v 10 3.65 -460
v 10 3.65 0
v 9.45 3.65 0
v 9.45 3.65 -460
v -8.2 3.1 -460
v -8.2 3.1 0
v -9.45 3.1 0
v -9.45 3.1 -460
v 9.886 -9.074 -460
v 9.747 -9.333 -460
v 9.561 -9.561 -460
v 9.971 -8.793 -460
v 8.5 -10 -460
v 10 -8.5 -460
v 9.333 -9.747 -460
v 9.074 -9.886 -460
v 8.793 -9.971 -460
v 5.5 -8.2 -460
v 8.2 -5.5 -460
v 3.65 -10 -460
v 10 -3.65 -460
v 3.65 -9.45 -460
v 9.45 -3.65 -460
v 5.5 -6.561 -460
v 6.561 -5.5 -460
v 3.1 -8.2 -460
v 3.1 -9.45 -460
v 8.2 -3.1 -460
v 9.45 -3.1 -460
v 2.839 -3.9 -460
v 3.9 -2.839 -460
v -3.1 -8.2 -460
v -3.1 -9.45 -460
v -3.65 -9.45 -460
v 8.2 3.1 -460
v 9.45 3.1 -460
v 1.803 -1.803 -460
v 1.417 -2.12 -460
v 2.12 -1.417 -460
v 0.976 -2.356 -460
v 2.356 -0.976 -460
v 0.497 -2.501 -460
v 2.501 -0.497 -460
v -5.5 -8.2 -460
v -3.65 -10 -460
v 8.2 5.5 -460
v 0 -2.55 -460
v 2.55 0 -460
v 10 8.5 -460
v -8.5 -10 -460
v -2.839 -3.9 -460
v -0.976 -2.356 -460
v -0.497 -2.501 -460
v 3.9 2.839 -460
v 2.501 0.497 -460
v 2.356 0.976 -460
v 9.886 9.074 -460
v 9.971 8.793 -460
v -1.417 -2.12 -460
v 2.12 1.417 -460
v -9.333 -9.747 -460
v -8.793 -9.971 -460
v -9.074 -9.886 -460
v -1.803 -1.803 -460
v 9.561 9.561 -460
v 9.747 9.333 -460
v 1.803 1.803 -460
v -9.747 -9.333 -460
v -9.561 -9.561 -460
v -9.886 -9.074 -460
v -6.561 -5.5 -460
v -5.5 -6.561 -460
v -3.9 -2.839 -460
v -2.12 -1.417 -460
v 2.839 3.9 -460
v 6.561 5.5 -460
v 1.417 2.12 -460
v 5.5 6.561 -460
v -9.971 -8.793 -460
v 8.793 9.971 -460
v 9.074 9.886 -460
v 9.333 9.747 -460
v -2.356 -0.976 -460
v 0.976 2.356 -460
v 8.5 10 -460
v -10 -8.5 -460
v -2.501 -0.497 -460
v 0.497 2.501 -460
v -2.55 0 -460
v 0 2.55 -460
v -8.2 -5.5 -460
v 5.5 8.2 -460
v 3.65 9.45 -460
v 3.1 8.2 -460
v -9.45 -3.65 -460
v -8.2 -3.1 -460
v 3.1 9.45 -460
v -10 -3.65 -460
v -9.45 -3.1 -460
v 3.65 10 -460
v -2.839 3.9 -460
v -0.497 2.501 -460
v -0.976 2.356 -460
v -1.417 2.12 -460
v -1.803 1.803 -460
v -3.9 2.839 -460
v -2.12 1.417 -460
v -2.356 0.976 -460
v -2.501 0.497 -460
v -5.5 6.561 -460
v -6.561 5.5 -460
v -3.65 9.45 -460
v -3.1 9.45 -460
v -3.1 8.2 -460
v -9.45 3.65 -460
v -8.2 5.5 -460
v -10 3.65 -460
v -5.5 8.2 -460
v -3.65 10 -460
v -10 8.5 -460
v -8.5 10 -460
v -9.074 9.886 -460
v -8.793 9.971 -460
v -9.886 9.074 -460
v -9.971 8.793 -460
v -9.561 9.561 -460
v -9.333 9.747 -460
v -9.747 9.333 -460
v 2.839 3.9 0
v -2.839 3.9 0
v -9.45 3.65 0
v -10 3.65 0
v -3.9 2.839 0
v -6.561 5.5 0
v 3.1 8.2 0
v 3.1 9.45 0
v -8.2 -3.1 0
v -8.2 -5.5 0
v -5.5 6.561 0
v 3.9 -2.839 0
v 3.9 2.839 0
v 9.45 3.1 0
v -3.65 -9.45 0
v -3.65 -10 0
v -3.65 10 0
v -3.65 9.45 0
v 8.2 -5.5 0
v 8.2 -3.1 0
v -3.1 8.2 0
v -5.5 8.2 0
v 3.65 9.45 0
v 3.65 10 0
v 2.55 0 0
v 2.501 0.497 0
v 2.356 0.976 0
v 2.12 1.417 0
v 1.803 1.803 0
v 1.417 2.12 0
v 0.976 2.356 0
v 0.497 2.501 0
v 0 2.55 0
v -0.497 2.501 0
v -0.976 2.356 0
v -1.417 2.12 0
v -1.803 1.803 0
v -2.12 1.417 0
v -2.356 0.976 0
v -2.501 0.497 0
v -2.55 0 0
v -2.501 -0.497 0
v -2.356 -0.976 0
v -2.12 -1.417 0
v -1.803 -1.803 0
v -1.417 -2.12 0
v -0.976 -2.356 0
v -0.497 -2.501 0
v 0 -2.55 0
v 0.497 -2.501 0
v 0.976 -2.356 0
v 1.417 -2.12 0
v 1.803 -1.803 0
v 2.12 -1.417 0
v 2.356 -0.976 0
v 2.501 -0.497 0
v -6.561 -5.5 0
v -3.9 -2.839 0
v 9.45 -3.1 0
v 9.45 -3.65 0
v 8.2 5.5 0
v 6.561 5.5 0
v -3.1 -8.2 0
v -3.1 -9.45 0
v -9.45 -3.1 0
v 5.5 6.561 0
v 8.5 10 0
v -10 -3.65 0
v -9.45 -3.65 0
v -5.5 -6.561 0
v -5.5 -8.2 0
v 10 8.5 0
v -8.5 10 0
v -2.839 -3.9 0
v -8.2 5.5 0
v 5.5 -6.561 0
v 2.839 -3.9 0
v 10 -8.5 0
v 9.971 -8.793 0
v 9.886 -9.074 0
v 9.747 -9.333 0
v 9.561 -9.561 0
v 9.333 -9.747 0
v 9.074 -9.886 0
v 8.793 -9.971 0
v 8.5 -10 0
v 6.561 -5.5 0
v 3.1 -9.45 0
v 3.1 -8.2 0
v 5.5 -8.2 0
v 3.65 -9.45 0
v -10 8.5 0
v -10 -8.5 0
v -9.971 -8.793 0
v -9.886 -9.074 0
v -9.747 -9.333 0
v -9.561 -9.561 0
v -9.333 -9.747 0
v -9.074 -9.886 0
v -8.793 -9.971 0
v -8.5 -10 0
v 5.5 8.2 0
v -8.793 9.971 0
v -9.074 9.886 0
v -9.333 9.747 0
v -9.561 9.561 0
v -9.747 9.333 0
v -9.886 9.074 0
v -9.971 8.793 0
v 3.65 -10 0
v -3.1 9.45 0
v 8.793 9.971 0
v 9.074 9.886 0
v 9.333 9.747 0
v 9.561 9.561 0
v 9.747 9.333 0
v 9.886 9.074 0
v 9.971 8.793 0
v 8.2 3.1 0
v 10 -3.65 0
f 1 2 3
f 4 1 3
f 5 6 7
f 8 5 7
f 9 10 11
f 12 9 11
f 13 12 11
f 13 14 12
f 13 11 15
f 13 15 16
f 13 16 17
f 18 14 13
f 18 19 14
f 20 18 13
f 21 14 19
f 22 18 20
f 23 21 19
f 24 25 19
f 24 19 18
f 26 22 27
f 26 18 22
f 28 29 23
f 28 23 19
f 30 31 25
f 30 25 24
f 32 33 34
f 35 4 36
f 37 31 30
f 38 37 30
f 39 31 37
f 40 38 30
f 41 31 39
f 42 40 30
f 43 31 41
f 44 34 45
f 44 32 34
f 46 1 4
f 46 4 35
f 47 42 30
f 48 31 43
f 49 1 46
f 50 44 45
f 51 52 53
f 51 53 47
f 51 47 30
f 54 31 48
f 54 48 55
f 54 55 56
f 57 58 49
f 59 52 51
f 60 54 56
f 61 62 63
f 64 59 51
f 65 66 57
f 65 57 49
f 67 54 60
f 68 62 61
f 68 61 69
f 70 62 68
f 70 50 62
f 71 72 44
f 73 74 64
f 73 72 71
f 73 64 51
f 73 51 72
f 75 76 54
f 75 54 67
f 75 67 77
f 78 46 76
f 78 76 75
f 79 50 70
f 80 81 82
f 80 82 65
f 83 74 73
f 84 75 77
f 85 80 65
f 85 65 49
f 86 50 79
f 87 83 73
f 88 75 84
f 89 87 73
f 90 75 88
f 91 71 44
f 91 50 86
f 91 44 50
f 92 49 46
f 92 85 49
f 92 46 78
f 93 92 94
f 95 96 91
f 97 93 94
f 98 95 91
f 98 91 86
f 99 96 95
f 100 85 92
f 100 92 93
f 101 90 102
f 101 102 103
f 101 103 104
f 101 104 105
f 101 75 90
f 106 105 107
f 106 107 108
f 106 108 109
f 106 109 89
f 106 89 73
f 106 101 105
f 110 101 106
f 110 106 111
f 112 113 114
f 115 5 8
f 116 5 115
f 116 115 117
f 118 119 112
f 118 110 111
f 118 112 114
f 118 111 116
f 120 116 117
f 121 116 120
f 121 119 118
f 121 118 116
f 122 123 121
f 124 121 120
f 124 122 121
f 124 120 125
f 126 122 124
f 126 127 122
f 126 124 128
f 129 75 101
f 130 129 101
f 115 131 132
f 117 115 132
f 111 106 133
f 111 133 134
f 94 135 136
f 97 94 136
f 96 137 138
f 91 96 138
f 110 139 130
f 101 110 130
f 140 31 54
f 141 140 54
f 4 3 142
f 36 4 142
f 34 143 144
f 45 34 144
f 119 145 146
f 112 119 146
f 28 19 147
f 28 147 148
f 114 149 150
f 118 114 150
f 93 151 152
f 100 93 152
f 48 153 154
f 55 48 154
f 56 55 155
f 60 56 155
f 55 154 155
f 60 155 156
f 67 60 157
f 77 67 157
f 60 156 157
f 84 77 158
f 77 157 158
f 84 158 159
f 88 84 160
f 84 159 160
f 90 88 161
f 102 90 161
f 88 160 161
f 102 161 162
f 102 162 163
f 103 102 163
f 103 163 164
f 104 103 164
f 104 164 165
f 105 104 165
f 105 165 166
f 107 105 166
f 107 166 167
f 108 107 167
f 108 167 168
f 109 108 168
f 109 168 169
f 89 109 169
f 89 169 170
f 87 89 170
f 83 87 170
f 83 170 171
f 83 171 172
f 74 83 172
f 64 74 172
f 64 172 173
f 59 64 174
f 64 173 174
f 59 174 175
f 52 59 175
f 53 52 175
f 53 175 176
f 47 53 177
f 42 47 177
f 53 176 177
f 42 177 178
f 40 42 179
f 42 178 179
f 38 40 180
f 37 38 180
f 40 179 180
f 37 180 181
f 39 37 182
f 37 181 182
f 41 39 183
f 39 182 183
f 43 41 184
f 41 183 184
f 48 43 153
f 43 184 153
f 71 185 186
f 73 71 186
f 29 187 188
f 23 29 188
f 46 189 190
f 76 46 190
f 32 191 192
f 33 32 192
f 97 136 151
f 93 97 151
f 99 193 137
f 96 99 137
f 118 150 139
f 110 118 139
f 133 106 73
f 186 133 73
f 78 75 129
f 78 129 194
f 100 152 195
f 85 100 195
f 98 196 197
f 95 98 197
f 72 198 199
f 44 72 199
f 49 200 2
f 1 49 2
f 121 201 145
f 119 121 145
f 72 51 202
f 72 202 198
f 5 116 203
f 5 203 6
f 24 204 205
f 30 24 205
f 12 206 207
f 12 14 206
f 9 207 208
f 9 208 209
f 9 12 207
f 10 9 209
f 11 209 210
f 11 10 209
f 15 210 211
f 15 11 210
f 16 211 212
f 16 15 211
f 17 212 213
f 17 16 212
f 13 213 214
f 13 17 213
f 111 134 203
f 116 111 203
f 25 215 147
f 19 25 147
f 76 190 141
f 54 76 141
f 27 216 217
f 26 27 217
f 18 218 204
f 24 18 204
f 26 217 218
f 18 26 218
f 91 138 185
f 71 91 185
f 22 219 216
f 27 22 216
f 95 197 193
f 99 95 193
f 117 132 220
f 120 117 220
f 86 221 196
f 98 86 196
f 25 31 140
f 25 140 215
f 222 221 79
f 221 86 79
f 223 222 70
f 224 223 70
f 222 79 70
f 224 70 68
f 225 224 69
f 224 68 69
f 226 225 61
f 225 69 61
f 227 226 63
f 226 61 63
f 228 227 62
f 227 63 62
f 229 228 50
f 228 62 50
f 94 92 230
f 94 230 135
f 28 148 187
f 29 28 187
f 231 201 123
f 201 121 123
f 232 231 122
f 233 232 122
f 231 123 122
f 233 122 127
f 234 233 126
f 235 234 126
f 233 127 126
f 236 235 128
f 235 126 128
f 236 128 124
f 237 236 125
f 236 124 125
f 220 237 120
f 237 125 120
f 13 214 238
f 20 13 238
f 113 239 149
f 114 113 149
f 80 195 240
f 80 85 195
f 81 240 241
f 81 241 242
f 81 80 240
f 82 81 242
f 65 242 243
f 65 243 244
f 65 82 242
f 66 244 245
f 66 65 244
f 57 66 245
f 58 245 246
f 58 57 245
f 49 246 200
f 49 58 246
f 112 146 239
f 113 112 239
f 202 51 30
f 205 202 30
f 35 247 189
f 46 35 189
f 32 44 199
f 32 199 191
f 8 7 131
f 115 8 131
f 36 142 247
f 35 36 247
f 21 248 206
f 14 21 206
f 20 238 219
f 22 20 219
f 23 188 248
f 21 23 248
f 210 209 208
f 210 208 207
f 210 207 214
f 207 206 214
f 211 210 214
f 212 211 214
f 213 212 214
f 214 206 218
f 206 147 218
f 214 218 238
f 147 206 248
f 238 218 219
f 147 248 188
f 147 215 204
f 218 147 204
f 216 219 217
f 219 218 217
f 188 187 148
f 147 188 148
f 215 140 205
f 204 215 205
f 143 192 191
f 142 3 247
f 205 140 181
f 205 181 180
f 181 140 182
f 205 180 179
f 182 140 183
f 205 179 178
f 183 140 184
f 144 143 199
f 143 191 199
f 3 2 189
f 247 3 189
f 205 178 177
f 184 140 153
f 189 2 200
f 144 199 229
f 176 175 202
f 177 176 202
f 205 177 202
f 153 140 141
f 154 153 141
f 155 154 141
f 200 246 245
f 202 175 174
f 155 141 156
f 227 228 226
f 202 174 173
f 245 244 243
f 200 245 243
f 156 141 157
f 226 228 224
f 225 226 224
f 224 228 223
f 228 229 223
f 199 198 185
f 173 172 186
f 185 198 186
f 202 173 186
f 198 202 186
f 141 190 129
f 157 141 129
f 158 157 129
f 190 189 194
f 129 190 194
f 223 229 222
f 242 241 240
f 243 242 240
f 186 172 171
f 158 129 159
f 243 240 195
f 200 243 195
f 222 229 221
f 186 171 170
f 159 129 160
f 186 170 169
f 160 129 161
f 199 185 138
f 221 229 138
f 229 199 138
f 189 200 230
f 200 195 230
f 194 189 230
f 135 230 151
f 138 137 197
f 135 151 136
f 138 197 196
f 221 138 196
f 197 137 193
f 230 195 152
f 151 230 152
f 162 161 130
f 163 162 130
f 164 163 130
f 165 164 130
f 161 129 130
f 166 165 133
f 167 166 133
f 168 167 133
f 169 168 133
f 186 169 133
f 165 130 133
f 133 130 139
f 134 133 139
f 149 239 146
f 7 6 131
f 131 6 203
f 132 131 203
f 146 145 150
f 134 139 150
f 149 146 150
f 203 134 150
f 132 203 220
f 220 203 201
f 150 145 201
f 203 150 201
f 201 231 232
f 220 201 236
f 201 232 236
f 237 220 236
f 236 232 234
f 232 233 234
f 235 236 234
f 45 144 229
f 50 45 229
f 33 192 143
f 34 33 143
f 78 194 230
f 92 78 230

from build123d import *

# Parameters (mm, degrees)
BOSS_EXTRUDE1_DEPTH = 460
SKETCH3_R           = 2.55
CUT_EXTRUDE1_DEPTH  = 461.21733996
FILLET1_R           = 1.5


with BuildPart() as part:
    # Sketch2 → Boss-Extrude1 (new body)
    with BuildSketch(Plane.XY):
        Polygon((-10, 10), (-3.65, 10), (-3.65, 9.45), (-3.1, 9.45), (-3.1, 8.2), (-5.5, 8.2), (-5.5, 6.560660172), (-2.839339828, 3.9), (0, 3.9), (2.839339828, 3.9), (5.5, 6.560660172), (5.5, 8.2), (3.1, 8.2), (3.1, 9.45), (3.65, 9.45), (3.65, 10), (10, 10), (10, 3.65), (9.45, 3.65), (9.45, 3.1), (8.2, 3.1), (8.2, 5.5), (6.560660172, 5.5), (3.9, 2.839339828), (3.9, 0), (3.9, -2.839339828), (6.560660172, -5.5), (8.2, -5.5), (8.2, -3.1), (9.45, -3.1), (9.45, -3.65), (10, -3.65), (10, -10), (3.65, -10), (3.65, -9.45), (3.1, -9.45), (3.1, -8.2), (5.5, -8.2), (5.5, -6.560660172), (2.839339828, -3.9), (0, -3.9), (-2.839339828, -3.9), (-5.5, -6.560660172), (-5.5, -8.2), (-3.1, -8.2), (-3.1, -9.45), (-3.65, -9.45), (-3.65, -10), (-10, -10), (-10, -3.65), (-9.45, -3.65), (-9.45, -3.1), (-8.2, -3.1), (-8.2, -5.5), (-6.560660172, -5.5), (-3.9, -2.839339828), (-3.9, 0), (-3.9, 2.839339828), (-6.560660172, 5.5), (-8.2, 5.5), (-8.2, 3.1), (-9.45, 3.1), (-9.45, 3.65), (-10, 3.65), align=None)
    extrude(amount=-BOSS_EXTRUDE1_DEPTH)

    # Sketch3 → Cut-Extrude1 (cut, through all)
    with BuildSketch(Plane.XY):
        Circle(SKETCH3_R)
    extrude(amount=-CUT_EXTRUDE1_DEPTH, mode=Mode.SUBTRACT)

    # Fillet1
    fillet1_edges = [part.edges().sort_by_distance(p)[0] for p in [
        (10, 10, -230),
        (10, -10, -230),
        (-10, -10, -230),
        (-10, 10, -230),
    ]]
    fillet(fillet1_edges, radius=FILLET1_R)


solid = part.part
